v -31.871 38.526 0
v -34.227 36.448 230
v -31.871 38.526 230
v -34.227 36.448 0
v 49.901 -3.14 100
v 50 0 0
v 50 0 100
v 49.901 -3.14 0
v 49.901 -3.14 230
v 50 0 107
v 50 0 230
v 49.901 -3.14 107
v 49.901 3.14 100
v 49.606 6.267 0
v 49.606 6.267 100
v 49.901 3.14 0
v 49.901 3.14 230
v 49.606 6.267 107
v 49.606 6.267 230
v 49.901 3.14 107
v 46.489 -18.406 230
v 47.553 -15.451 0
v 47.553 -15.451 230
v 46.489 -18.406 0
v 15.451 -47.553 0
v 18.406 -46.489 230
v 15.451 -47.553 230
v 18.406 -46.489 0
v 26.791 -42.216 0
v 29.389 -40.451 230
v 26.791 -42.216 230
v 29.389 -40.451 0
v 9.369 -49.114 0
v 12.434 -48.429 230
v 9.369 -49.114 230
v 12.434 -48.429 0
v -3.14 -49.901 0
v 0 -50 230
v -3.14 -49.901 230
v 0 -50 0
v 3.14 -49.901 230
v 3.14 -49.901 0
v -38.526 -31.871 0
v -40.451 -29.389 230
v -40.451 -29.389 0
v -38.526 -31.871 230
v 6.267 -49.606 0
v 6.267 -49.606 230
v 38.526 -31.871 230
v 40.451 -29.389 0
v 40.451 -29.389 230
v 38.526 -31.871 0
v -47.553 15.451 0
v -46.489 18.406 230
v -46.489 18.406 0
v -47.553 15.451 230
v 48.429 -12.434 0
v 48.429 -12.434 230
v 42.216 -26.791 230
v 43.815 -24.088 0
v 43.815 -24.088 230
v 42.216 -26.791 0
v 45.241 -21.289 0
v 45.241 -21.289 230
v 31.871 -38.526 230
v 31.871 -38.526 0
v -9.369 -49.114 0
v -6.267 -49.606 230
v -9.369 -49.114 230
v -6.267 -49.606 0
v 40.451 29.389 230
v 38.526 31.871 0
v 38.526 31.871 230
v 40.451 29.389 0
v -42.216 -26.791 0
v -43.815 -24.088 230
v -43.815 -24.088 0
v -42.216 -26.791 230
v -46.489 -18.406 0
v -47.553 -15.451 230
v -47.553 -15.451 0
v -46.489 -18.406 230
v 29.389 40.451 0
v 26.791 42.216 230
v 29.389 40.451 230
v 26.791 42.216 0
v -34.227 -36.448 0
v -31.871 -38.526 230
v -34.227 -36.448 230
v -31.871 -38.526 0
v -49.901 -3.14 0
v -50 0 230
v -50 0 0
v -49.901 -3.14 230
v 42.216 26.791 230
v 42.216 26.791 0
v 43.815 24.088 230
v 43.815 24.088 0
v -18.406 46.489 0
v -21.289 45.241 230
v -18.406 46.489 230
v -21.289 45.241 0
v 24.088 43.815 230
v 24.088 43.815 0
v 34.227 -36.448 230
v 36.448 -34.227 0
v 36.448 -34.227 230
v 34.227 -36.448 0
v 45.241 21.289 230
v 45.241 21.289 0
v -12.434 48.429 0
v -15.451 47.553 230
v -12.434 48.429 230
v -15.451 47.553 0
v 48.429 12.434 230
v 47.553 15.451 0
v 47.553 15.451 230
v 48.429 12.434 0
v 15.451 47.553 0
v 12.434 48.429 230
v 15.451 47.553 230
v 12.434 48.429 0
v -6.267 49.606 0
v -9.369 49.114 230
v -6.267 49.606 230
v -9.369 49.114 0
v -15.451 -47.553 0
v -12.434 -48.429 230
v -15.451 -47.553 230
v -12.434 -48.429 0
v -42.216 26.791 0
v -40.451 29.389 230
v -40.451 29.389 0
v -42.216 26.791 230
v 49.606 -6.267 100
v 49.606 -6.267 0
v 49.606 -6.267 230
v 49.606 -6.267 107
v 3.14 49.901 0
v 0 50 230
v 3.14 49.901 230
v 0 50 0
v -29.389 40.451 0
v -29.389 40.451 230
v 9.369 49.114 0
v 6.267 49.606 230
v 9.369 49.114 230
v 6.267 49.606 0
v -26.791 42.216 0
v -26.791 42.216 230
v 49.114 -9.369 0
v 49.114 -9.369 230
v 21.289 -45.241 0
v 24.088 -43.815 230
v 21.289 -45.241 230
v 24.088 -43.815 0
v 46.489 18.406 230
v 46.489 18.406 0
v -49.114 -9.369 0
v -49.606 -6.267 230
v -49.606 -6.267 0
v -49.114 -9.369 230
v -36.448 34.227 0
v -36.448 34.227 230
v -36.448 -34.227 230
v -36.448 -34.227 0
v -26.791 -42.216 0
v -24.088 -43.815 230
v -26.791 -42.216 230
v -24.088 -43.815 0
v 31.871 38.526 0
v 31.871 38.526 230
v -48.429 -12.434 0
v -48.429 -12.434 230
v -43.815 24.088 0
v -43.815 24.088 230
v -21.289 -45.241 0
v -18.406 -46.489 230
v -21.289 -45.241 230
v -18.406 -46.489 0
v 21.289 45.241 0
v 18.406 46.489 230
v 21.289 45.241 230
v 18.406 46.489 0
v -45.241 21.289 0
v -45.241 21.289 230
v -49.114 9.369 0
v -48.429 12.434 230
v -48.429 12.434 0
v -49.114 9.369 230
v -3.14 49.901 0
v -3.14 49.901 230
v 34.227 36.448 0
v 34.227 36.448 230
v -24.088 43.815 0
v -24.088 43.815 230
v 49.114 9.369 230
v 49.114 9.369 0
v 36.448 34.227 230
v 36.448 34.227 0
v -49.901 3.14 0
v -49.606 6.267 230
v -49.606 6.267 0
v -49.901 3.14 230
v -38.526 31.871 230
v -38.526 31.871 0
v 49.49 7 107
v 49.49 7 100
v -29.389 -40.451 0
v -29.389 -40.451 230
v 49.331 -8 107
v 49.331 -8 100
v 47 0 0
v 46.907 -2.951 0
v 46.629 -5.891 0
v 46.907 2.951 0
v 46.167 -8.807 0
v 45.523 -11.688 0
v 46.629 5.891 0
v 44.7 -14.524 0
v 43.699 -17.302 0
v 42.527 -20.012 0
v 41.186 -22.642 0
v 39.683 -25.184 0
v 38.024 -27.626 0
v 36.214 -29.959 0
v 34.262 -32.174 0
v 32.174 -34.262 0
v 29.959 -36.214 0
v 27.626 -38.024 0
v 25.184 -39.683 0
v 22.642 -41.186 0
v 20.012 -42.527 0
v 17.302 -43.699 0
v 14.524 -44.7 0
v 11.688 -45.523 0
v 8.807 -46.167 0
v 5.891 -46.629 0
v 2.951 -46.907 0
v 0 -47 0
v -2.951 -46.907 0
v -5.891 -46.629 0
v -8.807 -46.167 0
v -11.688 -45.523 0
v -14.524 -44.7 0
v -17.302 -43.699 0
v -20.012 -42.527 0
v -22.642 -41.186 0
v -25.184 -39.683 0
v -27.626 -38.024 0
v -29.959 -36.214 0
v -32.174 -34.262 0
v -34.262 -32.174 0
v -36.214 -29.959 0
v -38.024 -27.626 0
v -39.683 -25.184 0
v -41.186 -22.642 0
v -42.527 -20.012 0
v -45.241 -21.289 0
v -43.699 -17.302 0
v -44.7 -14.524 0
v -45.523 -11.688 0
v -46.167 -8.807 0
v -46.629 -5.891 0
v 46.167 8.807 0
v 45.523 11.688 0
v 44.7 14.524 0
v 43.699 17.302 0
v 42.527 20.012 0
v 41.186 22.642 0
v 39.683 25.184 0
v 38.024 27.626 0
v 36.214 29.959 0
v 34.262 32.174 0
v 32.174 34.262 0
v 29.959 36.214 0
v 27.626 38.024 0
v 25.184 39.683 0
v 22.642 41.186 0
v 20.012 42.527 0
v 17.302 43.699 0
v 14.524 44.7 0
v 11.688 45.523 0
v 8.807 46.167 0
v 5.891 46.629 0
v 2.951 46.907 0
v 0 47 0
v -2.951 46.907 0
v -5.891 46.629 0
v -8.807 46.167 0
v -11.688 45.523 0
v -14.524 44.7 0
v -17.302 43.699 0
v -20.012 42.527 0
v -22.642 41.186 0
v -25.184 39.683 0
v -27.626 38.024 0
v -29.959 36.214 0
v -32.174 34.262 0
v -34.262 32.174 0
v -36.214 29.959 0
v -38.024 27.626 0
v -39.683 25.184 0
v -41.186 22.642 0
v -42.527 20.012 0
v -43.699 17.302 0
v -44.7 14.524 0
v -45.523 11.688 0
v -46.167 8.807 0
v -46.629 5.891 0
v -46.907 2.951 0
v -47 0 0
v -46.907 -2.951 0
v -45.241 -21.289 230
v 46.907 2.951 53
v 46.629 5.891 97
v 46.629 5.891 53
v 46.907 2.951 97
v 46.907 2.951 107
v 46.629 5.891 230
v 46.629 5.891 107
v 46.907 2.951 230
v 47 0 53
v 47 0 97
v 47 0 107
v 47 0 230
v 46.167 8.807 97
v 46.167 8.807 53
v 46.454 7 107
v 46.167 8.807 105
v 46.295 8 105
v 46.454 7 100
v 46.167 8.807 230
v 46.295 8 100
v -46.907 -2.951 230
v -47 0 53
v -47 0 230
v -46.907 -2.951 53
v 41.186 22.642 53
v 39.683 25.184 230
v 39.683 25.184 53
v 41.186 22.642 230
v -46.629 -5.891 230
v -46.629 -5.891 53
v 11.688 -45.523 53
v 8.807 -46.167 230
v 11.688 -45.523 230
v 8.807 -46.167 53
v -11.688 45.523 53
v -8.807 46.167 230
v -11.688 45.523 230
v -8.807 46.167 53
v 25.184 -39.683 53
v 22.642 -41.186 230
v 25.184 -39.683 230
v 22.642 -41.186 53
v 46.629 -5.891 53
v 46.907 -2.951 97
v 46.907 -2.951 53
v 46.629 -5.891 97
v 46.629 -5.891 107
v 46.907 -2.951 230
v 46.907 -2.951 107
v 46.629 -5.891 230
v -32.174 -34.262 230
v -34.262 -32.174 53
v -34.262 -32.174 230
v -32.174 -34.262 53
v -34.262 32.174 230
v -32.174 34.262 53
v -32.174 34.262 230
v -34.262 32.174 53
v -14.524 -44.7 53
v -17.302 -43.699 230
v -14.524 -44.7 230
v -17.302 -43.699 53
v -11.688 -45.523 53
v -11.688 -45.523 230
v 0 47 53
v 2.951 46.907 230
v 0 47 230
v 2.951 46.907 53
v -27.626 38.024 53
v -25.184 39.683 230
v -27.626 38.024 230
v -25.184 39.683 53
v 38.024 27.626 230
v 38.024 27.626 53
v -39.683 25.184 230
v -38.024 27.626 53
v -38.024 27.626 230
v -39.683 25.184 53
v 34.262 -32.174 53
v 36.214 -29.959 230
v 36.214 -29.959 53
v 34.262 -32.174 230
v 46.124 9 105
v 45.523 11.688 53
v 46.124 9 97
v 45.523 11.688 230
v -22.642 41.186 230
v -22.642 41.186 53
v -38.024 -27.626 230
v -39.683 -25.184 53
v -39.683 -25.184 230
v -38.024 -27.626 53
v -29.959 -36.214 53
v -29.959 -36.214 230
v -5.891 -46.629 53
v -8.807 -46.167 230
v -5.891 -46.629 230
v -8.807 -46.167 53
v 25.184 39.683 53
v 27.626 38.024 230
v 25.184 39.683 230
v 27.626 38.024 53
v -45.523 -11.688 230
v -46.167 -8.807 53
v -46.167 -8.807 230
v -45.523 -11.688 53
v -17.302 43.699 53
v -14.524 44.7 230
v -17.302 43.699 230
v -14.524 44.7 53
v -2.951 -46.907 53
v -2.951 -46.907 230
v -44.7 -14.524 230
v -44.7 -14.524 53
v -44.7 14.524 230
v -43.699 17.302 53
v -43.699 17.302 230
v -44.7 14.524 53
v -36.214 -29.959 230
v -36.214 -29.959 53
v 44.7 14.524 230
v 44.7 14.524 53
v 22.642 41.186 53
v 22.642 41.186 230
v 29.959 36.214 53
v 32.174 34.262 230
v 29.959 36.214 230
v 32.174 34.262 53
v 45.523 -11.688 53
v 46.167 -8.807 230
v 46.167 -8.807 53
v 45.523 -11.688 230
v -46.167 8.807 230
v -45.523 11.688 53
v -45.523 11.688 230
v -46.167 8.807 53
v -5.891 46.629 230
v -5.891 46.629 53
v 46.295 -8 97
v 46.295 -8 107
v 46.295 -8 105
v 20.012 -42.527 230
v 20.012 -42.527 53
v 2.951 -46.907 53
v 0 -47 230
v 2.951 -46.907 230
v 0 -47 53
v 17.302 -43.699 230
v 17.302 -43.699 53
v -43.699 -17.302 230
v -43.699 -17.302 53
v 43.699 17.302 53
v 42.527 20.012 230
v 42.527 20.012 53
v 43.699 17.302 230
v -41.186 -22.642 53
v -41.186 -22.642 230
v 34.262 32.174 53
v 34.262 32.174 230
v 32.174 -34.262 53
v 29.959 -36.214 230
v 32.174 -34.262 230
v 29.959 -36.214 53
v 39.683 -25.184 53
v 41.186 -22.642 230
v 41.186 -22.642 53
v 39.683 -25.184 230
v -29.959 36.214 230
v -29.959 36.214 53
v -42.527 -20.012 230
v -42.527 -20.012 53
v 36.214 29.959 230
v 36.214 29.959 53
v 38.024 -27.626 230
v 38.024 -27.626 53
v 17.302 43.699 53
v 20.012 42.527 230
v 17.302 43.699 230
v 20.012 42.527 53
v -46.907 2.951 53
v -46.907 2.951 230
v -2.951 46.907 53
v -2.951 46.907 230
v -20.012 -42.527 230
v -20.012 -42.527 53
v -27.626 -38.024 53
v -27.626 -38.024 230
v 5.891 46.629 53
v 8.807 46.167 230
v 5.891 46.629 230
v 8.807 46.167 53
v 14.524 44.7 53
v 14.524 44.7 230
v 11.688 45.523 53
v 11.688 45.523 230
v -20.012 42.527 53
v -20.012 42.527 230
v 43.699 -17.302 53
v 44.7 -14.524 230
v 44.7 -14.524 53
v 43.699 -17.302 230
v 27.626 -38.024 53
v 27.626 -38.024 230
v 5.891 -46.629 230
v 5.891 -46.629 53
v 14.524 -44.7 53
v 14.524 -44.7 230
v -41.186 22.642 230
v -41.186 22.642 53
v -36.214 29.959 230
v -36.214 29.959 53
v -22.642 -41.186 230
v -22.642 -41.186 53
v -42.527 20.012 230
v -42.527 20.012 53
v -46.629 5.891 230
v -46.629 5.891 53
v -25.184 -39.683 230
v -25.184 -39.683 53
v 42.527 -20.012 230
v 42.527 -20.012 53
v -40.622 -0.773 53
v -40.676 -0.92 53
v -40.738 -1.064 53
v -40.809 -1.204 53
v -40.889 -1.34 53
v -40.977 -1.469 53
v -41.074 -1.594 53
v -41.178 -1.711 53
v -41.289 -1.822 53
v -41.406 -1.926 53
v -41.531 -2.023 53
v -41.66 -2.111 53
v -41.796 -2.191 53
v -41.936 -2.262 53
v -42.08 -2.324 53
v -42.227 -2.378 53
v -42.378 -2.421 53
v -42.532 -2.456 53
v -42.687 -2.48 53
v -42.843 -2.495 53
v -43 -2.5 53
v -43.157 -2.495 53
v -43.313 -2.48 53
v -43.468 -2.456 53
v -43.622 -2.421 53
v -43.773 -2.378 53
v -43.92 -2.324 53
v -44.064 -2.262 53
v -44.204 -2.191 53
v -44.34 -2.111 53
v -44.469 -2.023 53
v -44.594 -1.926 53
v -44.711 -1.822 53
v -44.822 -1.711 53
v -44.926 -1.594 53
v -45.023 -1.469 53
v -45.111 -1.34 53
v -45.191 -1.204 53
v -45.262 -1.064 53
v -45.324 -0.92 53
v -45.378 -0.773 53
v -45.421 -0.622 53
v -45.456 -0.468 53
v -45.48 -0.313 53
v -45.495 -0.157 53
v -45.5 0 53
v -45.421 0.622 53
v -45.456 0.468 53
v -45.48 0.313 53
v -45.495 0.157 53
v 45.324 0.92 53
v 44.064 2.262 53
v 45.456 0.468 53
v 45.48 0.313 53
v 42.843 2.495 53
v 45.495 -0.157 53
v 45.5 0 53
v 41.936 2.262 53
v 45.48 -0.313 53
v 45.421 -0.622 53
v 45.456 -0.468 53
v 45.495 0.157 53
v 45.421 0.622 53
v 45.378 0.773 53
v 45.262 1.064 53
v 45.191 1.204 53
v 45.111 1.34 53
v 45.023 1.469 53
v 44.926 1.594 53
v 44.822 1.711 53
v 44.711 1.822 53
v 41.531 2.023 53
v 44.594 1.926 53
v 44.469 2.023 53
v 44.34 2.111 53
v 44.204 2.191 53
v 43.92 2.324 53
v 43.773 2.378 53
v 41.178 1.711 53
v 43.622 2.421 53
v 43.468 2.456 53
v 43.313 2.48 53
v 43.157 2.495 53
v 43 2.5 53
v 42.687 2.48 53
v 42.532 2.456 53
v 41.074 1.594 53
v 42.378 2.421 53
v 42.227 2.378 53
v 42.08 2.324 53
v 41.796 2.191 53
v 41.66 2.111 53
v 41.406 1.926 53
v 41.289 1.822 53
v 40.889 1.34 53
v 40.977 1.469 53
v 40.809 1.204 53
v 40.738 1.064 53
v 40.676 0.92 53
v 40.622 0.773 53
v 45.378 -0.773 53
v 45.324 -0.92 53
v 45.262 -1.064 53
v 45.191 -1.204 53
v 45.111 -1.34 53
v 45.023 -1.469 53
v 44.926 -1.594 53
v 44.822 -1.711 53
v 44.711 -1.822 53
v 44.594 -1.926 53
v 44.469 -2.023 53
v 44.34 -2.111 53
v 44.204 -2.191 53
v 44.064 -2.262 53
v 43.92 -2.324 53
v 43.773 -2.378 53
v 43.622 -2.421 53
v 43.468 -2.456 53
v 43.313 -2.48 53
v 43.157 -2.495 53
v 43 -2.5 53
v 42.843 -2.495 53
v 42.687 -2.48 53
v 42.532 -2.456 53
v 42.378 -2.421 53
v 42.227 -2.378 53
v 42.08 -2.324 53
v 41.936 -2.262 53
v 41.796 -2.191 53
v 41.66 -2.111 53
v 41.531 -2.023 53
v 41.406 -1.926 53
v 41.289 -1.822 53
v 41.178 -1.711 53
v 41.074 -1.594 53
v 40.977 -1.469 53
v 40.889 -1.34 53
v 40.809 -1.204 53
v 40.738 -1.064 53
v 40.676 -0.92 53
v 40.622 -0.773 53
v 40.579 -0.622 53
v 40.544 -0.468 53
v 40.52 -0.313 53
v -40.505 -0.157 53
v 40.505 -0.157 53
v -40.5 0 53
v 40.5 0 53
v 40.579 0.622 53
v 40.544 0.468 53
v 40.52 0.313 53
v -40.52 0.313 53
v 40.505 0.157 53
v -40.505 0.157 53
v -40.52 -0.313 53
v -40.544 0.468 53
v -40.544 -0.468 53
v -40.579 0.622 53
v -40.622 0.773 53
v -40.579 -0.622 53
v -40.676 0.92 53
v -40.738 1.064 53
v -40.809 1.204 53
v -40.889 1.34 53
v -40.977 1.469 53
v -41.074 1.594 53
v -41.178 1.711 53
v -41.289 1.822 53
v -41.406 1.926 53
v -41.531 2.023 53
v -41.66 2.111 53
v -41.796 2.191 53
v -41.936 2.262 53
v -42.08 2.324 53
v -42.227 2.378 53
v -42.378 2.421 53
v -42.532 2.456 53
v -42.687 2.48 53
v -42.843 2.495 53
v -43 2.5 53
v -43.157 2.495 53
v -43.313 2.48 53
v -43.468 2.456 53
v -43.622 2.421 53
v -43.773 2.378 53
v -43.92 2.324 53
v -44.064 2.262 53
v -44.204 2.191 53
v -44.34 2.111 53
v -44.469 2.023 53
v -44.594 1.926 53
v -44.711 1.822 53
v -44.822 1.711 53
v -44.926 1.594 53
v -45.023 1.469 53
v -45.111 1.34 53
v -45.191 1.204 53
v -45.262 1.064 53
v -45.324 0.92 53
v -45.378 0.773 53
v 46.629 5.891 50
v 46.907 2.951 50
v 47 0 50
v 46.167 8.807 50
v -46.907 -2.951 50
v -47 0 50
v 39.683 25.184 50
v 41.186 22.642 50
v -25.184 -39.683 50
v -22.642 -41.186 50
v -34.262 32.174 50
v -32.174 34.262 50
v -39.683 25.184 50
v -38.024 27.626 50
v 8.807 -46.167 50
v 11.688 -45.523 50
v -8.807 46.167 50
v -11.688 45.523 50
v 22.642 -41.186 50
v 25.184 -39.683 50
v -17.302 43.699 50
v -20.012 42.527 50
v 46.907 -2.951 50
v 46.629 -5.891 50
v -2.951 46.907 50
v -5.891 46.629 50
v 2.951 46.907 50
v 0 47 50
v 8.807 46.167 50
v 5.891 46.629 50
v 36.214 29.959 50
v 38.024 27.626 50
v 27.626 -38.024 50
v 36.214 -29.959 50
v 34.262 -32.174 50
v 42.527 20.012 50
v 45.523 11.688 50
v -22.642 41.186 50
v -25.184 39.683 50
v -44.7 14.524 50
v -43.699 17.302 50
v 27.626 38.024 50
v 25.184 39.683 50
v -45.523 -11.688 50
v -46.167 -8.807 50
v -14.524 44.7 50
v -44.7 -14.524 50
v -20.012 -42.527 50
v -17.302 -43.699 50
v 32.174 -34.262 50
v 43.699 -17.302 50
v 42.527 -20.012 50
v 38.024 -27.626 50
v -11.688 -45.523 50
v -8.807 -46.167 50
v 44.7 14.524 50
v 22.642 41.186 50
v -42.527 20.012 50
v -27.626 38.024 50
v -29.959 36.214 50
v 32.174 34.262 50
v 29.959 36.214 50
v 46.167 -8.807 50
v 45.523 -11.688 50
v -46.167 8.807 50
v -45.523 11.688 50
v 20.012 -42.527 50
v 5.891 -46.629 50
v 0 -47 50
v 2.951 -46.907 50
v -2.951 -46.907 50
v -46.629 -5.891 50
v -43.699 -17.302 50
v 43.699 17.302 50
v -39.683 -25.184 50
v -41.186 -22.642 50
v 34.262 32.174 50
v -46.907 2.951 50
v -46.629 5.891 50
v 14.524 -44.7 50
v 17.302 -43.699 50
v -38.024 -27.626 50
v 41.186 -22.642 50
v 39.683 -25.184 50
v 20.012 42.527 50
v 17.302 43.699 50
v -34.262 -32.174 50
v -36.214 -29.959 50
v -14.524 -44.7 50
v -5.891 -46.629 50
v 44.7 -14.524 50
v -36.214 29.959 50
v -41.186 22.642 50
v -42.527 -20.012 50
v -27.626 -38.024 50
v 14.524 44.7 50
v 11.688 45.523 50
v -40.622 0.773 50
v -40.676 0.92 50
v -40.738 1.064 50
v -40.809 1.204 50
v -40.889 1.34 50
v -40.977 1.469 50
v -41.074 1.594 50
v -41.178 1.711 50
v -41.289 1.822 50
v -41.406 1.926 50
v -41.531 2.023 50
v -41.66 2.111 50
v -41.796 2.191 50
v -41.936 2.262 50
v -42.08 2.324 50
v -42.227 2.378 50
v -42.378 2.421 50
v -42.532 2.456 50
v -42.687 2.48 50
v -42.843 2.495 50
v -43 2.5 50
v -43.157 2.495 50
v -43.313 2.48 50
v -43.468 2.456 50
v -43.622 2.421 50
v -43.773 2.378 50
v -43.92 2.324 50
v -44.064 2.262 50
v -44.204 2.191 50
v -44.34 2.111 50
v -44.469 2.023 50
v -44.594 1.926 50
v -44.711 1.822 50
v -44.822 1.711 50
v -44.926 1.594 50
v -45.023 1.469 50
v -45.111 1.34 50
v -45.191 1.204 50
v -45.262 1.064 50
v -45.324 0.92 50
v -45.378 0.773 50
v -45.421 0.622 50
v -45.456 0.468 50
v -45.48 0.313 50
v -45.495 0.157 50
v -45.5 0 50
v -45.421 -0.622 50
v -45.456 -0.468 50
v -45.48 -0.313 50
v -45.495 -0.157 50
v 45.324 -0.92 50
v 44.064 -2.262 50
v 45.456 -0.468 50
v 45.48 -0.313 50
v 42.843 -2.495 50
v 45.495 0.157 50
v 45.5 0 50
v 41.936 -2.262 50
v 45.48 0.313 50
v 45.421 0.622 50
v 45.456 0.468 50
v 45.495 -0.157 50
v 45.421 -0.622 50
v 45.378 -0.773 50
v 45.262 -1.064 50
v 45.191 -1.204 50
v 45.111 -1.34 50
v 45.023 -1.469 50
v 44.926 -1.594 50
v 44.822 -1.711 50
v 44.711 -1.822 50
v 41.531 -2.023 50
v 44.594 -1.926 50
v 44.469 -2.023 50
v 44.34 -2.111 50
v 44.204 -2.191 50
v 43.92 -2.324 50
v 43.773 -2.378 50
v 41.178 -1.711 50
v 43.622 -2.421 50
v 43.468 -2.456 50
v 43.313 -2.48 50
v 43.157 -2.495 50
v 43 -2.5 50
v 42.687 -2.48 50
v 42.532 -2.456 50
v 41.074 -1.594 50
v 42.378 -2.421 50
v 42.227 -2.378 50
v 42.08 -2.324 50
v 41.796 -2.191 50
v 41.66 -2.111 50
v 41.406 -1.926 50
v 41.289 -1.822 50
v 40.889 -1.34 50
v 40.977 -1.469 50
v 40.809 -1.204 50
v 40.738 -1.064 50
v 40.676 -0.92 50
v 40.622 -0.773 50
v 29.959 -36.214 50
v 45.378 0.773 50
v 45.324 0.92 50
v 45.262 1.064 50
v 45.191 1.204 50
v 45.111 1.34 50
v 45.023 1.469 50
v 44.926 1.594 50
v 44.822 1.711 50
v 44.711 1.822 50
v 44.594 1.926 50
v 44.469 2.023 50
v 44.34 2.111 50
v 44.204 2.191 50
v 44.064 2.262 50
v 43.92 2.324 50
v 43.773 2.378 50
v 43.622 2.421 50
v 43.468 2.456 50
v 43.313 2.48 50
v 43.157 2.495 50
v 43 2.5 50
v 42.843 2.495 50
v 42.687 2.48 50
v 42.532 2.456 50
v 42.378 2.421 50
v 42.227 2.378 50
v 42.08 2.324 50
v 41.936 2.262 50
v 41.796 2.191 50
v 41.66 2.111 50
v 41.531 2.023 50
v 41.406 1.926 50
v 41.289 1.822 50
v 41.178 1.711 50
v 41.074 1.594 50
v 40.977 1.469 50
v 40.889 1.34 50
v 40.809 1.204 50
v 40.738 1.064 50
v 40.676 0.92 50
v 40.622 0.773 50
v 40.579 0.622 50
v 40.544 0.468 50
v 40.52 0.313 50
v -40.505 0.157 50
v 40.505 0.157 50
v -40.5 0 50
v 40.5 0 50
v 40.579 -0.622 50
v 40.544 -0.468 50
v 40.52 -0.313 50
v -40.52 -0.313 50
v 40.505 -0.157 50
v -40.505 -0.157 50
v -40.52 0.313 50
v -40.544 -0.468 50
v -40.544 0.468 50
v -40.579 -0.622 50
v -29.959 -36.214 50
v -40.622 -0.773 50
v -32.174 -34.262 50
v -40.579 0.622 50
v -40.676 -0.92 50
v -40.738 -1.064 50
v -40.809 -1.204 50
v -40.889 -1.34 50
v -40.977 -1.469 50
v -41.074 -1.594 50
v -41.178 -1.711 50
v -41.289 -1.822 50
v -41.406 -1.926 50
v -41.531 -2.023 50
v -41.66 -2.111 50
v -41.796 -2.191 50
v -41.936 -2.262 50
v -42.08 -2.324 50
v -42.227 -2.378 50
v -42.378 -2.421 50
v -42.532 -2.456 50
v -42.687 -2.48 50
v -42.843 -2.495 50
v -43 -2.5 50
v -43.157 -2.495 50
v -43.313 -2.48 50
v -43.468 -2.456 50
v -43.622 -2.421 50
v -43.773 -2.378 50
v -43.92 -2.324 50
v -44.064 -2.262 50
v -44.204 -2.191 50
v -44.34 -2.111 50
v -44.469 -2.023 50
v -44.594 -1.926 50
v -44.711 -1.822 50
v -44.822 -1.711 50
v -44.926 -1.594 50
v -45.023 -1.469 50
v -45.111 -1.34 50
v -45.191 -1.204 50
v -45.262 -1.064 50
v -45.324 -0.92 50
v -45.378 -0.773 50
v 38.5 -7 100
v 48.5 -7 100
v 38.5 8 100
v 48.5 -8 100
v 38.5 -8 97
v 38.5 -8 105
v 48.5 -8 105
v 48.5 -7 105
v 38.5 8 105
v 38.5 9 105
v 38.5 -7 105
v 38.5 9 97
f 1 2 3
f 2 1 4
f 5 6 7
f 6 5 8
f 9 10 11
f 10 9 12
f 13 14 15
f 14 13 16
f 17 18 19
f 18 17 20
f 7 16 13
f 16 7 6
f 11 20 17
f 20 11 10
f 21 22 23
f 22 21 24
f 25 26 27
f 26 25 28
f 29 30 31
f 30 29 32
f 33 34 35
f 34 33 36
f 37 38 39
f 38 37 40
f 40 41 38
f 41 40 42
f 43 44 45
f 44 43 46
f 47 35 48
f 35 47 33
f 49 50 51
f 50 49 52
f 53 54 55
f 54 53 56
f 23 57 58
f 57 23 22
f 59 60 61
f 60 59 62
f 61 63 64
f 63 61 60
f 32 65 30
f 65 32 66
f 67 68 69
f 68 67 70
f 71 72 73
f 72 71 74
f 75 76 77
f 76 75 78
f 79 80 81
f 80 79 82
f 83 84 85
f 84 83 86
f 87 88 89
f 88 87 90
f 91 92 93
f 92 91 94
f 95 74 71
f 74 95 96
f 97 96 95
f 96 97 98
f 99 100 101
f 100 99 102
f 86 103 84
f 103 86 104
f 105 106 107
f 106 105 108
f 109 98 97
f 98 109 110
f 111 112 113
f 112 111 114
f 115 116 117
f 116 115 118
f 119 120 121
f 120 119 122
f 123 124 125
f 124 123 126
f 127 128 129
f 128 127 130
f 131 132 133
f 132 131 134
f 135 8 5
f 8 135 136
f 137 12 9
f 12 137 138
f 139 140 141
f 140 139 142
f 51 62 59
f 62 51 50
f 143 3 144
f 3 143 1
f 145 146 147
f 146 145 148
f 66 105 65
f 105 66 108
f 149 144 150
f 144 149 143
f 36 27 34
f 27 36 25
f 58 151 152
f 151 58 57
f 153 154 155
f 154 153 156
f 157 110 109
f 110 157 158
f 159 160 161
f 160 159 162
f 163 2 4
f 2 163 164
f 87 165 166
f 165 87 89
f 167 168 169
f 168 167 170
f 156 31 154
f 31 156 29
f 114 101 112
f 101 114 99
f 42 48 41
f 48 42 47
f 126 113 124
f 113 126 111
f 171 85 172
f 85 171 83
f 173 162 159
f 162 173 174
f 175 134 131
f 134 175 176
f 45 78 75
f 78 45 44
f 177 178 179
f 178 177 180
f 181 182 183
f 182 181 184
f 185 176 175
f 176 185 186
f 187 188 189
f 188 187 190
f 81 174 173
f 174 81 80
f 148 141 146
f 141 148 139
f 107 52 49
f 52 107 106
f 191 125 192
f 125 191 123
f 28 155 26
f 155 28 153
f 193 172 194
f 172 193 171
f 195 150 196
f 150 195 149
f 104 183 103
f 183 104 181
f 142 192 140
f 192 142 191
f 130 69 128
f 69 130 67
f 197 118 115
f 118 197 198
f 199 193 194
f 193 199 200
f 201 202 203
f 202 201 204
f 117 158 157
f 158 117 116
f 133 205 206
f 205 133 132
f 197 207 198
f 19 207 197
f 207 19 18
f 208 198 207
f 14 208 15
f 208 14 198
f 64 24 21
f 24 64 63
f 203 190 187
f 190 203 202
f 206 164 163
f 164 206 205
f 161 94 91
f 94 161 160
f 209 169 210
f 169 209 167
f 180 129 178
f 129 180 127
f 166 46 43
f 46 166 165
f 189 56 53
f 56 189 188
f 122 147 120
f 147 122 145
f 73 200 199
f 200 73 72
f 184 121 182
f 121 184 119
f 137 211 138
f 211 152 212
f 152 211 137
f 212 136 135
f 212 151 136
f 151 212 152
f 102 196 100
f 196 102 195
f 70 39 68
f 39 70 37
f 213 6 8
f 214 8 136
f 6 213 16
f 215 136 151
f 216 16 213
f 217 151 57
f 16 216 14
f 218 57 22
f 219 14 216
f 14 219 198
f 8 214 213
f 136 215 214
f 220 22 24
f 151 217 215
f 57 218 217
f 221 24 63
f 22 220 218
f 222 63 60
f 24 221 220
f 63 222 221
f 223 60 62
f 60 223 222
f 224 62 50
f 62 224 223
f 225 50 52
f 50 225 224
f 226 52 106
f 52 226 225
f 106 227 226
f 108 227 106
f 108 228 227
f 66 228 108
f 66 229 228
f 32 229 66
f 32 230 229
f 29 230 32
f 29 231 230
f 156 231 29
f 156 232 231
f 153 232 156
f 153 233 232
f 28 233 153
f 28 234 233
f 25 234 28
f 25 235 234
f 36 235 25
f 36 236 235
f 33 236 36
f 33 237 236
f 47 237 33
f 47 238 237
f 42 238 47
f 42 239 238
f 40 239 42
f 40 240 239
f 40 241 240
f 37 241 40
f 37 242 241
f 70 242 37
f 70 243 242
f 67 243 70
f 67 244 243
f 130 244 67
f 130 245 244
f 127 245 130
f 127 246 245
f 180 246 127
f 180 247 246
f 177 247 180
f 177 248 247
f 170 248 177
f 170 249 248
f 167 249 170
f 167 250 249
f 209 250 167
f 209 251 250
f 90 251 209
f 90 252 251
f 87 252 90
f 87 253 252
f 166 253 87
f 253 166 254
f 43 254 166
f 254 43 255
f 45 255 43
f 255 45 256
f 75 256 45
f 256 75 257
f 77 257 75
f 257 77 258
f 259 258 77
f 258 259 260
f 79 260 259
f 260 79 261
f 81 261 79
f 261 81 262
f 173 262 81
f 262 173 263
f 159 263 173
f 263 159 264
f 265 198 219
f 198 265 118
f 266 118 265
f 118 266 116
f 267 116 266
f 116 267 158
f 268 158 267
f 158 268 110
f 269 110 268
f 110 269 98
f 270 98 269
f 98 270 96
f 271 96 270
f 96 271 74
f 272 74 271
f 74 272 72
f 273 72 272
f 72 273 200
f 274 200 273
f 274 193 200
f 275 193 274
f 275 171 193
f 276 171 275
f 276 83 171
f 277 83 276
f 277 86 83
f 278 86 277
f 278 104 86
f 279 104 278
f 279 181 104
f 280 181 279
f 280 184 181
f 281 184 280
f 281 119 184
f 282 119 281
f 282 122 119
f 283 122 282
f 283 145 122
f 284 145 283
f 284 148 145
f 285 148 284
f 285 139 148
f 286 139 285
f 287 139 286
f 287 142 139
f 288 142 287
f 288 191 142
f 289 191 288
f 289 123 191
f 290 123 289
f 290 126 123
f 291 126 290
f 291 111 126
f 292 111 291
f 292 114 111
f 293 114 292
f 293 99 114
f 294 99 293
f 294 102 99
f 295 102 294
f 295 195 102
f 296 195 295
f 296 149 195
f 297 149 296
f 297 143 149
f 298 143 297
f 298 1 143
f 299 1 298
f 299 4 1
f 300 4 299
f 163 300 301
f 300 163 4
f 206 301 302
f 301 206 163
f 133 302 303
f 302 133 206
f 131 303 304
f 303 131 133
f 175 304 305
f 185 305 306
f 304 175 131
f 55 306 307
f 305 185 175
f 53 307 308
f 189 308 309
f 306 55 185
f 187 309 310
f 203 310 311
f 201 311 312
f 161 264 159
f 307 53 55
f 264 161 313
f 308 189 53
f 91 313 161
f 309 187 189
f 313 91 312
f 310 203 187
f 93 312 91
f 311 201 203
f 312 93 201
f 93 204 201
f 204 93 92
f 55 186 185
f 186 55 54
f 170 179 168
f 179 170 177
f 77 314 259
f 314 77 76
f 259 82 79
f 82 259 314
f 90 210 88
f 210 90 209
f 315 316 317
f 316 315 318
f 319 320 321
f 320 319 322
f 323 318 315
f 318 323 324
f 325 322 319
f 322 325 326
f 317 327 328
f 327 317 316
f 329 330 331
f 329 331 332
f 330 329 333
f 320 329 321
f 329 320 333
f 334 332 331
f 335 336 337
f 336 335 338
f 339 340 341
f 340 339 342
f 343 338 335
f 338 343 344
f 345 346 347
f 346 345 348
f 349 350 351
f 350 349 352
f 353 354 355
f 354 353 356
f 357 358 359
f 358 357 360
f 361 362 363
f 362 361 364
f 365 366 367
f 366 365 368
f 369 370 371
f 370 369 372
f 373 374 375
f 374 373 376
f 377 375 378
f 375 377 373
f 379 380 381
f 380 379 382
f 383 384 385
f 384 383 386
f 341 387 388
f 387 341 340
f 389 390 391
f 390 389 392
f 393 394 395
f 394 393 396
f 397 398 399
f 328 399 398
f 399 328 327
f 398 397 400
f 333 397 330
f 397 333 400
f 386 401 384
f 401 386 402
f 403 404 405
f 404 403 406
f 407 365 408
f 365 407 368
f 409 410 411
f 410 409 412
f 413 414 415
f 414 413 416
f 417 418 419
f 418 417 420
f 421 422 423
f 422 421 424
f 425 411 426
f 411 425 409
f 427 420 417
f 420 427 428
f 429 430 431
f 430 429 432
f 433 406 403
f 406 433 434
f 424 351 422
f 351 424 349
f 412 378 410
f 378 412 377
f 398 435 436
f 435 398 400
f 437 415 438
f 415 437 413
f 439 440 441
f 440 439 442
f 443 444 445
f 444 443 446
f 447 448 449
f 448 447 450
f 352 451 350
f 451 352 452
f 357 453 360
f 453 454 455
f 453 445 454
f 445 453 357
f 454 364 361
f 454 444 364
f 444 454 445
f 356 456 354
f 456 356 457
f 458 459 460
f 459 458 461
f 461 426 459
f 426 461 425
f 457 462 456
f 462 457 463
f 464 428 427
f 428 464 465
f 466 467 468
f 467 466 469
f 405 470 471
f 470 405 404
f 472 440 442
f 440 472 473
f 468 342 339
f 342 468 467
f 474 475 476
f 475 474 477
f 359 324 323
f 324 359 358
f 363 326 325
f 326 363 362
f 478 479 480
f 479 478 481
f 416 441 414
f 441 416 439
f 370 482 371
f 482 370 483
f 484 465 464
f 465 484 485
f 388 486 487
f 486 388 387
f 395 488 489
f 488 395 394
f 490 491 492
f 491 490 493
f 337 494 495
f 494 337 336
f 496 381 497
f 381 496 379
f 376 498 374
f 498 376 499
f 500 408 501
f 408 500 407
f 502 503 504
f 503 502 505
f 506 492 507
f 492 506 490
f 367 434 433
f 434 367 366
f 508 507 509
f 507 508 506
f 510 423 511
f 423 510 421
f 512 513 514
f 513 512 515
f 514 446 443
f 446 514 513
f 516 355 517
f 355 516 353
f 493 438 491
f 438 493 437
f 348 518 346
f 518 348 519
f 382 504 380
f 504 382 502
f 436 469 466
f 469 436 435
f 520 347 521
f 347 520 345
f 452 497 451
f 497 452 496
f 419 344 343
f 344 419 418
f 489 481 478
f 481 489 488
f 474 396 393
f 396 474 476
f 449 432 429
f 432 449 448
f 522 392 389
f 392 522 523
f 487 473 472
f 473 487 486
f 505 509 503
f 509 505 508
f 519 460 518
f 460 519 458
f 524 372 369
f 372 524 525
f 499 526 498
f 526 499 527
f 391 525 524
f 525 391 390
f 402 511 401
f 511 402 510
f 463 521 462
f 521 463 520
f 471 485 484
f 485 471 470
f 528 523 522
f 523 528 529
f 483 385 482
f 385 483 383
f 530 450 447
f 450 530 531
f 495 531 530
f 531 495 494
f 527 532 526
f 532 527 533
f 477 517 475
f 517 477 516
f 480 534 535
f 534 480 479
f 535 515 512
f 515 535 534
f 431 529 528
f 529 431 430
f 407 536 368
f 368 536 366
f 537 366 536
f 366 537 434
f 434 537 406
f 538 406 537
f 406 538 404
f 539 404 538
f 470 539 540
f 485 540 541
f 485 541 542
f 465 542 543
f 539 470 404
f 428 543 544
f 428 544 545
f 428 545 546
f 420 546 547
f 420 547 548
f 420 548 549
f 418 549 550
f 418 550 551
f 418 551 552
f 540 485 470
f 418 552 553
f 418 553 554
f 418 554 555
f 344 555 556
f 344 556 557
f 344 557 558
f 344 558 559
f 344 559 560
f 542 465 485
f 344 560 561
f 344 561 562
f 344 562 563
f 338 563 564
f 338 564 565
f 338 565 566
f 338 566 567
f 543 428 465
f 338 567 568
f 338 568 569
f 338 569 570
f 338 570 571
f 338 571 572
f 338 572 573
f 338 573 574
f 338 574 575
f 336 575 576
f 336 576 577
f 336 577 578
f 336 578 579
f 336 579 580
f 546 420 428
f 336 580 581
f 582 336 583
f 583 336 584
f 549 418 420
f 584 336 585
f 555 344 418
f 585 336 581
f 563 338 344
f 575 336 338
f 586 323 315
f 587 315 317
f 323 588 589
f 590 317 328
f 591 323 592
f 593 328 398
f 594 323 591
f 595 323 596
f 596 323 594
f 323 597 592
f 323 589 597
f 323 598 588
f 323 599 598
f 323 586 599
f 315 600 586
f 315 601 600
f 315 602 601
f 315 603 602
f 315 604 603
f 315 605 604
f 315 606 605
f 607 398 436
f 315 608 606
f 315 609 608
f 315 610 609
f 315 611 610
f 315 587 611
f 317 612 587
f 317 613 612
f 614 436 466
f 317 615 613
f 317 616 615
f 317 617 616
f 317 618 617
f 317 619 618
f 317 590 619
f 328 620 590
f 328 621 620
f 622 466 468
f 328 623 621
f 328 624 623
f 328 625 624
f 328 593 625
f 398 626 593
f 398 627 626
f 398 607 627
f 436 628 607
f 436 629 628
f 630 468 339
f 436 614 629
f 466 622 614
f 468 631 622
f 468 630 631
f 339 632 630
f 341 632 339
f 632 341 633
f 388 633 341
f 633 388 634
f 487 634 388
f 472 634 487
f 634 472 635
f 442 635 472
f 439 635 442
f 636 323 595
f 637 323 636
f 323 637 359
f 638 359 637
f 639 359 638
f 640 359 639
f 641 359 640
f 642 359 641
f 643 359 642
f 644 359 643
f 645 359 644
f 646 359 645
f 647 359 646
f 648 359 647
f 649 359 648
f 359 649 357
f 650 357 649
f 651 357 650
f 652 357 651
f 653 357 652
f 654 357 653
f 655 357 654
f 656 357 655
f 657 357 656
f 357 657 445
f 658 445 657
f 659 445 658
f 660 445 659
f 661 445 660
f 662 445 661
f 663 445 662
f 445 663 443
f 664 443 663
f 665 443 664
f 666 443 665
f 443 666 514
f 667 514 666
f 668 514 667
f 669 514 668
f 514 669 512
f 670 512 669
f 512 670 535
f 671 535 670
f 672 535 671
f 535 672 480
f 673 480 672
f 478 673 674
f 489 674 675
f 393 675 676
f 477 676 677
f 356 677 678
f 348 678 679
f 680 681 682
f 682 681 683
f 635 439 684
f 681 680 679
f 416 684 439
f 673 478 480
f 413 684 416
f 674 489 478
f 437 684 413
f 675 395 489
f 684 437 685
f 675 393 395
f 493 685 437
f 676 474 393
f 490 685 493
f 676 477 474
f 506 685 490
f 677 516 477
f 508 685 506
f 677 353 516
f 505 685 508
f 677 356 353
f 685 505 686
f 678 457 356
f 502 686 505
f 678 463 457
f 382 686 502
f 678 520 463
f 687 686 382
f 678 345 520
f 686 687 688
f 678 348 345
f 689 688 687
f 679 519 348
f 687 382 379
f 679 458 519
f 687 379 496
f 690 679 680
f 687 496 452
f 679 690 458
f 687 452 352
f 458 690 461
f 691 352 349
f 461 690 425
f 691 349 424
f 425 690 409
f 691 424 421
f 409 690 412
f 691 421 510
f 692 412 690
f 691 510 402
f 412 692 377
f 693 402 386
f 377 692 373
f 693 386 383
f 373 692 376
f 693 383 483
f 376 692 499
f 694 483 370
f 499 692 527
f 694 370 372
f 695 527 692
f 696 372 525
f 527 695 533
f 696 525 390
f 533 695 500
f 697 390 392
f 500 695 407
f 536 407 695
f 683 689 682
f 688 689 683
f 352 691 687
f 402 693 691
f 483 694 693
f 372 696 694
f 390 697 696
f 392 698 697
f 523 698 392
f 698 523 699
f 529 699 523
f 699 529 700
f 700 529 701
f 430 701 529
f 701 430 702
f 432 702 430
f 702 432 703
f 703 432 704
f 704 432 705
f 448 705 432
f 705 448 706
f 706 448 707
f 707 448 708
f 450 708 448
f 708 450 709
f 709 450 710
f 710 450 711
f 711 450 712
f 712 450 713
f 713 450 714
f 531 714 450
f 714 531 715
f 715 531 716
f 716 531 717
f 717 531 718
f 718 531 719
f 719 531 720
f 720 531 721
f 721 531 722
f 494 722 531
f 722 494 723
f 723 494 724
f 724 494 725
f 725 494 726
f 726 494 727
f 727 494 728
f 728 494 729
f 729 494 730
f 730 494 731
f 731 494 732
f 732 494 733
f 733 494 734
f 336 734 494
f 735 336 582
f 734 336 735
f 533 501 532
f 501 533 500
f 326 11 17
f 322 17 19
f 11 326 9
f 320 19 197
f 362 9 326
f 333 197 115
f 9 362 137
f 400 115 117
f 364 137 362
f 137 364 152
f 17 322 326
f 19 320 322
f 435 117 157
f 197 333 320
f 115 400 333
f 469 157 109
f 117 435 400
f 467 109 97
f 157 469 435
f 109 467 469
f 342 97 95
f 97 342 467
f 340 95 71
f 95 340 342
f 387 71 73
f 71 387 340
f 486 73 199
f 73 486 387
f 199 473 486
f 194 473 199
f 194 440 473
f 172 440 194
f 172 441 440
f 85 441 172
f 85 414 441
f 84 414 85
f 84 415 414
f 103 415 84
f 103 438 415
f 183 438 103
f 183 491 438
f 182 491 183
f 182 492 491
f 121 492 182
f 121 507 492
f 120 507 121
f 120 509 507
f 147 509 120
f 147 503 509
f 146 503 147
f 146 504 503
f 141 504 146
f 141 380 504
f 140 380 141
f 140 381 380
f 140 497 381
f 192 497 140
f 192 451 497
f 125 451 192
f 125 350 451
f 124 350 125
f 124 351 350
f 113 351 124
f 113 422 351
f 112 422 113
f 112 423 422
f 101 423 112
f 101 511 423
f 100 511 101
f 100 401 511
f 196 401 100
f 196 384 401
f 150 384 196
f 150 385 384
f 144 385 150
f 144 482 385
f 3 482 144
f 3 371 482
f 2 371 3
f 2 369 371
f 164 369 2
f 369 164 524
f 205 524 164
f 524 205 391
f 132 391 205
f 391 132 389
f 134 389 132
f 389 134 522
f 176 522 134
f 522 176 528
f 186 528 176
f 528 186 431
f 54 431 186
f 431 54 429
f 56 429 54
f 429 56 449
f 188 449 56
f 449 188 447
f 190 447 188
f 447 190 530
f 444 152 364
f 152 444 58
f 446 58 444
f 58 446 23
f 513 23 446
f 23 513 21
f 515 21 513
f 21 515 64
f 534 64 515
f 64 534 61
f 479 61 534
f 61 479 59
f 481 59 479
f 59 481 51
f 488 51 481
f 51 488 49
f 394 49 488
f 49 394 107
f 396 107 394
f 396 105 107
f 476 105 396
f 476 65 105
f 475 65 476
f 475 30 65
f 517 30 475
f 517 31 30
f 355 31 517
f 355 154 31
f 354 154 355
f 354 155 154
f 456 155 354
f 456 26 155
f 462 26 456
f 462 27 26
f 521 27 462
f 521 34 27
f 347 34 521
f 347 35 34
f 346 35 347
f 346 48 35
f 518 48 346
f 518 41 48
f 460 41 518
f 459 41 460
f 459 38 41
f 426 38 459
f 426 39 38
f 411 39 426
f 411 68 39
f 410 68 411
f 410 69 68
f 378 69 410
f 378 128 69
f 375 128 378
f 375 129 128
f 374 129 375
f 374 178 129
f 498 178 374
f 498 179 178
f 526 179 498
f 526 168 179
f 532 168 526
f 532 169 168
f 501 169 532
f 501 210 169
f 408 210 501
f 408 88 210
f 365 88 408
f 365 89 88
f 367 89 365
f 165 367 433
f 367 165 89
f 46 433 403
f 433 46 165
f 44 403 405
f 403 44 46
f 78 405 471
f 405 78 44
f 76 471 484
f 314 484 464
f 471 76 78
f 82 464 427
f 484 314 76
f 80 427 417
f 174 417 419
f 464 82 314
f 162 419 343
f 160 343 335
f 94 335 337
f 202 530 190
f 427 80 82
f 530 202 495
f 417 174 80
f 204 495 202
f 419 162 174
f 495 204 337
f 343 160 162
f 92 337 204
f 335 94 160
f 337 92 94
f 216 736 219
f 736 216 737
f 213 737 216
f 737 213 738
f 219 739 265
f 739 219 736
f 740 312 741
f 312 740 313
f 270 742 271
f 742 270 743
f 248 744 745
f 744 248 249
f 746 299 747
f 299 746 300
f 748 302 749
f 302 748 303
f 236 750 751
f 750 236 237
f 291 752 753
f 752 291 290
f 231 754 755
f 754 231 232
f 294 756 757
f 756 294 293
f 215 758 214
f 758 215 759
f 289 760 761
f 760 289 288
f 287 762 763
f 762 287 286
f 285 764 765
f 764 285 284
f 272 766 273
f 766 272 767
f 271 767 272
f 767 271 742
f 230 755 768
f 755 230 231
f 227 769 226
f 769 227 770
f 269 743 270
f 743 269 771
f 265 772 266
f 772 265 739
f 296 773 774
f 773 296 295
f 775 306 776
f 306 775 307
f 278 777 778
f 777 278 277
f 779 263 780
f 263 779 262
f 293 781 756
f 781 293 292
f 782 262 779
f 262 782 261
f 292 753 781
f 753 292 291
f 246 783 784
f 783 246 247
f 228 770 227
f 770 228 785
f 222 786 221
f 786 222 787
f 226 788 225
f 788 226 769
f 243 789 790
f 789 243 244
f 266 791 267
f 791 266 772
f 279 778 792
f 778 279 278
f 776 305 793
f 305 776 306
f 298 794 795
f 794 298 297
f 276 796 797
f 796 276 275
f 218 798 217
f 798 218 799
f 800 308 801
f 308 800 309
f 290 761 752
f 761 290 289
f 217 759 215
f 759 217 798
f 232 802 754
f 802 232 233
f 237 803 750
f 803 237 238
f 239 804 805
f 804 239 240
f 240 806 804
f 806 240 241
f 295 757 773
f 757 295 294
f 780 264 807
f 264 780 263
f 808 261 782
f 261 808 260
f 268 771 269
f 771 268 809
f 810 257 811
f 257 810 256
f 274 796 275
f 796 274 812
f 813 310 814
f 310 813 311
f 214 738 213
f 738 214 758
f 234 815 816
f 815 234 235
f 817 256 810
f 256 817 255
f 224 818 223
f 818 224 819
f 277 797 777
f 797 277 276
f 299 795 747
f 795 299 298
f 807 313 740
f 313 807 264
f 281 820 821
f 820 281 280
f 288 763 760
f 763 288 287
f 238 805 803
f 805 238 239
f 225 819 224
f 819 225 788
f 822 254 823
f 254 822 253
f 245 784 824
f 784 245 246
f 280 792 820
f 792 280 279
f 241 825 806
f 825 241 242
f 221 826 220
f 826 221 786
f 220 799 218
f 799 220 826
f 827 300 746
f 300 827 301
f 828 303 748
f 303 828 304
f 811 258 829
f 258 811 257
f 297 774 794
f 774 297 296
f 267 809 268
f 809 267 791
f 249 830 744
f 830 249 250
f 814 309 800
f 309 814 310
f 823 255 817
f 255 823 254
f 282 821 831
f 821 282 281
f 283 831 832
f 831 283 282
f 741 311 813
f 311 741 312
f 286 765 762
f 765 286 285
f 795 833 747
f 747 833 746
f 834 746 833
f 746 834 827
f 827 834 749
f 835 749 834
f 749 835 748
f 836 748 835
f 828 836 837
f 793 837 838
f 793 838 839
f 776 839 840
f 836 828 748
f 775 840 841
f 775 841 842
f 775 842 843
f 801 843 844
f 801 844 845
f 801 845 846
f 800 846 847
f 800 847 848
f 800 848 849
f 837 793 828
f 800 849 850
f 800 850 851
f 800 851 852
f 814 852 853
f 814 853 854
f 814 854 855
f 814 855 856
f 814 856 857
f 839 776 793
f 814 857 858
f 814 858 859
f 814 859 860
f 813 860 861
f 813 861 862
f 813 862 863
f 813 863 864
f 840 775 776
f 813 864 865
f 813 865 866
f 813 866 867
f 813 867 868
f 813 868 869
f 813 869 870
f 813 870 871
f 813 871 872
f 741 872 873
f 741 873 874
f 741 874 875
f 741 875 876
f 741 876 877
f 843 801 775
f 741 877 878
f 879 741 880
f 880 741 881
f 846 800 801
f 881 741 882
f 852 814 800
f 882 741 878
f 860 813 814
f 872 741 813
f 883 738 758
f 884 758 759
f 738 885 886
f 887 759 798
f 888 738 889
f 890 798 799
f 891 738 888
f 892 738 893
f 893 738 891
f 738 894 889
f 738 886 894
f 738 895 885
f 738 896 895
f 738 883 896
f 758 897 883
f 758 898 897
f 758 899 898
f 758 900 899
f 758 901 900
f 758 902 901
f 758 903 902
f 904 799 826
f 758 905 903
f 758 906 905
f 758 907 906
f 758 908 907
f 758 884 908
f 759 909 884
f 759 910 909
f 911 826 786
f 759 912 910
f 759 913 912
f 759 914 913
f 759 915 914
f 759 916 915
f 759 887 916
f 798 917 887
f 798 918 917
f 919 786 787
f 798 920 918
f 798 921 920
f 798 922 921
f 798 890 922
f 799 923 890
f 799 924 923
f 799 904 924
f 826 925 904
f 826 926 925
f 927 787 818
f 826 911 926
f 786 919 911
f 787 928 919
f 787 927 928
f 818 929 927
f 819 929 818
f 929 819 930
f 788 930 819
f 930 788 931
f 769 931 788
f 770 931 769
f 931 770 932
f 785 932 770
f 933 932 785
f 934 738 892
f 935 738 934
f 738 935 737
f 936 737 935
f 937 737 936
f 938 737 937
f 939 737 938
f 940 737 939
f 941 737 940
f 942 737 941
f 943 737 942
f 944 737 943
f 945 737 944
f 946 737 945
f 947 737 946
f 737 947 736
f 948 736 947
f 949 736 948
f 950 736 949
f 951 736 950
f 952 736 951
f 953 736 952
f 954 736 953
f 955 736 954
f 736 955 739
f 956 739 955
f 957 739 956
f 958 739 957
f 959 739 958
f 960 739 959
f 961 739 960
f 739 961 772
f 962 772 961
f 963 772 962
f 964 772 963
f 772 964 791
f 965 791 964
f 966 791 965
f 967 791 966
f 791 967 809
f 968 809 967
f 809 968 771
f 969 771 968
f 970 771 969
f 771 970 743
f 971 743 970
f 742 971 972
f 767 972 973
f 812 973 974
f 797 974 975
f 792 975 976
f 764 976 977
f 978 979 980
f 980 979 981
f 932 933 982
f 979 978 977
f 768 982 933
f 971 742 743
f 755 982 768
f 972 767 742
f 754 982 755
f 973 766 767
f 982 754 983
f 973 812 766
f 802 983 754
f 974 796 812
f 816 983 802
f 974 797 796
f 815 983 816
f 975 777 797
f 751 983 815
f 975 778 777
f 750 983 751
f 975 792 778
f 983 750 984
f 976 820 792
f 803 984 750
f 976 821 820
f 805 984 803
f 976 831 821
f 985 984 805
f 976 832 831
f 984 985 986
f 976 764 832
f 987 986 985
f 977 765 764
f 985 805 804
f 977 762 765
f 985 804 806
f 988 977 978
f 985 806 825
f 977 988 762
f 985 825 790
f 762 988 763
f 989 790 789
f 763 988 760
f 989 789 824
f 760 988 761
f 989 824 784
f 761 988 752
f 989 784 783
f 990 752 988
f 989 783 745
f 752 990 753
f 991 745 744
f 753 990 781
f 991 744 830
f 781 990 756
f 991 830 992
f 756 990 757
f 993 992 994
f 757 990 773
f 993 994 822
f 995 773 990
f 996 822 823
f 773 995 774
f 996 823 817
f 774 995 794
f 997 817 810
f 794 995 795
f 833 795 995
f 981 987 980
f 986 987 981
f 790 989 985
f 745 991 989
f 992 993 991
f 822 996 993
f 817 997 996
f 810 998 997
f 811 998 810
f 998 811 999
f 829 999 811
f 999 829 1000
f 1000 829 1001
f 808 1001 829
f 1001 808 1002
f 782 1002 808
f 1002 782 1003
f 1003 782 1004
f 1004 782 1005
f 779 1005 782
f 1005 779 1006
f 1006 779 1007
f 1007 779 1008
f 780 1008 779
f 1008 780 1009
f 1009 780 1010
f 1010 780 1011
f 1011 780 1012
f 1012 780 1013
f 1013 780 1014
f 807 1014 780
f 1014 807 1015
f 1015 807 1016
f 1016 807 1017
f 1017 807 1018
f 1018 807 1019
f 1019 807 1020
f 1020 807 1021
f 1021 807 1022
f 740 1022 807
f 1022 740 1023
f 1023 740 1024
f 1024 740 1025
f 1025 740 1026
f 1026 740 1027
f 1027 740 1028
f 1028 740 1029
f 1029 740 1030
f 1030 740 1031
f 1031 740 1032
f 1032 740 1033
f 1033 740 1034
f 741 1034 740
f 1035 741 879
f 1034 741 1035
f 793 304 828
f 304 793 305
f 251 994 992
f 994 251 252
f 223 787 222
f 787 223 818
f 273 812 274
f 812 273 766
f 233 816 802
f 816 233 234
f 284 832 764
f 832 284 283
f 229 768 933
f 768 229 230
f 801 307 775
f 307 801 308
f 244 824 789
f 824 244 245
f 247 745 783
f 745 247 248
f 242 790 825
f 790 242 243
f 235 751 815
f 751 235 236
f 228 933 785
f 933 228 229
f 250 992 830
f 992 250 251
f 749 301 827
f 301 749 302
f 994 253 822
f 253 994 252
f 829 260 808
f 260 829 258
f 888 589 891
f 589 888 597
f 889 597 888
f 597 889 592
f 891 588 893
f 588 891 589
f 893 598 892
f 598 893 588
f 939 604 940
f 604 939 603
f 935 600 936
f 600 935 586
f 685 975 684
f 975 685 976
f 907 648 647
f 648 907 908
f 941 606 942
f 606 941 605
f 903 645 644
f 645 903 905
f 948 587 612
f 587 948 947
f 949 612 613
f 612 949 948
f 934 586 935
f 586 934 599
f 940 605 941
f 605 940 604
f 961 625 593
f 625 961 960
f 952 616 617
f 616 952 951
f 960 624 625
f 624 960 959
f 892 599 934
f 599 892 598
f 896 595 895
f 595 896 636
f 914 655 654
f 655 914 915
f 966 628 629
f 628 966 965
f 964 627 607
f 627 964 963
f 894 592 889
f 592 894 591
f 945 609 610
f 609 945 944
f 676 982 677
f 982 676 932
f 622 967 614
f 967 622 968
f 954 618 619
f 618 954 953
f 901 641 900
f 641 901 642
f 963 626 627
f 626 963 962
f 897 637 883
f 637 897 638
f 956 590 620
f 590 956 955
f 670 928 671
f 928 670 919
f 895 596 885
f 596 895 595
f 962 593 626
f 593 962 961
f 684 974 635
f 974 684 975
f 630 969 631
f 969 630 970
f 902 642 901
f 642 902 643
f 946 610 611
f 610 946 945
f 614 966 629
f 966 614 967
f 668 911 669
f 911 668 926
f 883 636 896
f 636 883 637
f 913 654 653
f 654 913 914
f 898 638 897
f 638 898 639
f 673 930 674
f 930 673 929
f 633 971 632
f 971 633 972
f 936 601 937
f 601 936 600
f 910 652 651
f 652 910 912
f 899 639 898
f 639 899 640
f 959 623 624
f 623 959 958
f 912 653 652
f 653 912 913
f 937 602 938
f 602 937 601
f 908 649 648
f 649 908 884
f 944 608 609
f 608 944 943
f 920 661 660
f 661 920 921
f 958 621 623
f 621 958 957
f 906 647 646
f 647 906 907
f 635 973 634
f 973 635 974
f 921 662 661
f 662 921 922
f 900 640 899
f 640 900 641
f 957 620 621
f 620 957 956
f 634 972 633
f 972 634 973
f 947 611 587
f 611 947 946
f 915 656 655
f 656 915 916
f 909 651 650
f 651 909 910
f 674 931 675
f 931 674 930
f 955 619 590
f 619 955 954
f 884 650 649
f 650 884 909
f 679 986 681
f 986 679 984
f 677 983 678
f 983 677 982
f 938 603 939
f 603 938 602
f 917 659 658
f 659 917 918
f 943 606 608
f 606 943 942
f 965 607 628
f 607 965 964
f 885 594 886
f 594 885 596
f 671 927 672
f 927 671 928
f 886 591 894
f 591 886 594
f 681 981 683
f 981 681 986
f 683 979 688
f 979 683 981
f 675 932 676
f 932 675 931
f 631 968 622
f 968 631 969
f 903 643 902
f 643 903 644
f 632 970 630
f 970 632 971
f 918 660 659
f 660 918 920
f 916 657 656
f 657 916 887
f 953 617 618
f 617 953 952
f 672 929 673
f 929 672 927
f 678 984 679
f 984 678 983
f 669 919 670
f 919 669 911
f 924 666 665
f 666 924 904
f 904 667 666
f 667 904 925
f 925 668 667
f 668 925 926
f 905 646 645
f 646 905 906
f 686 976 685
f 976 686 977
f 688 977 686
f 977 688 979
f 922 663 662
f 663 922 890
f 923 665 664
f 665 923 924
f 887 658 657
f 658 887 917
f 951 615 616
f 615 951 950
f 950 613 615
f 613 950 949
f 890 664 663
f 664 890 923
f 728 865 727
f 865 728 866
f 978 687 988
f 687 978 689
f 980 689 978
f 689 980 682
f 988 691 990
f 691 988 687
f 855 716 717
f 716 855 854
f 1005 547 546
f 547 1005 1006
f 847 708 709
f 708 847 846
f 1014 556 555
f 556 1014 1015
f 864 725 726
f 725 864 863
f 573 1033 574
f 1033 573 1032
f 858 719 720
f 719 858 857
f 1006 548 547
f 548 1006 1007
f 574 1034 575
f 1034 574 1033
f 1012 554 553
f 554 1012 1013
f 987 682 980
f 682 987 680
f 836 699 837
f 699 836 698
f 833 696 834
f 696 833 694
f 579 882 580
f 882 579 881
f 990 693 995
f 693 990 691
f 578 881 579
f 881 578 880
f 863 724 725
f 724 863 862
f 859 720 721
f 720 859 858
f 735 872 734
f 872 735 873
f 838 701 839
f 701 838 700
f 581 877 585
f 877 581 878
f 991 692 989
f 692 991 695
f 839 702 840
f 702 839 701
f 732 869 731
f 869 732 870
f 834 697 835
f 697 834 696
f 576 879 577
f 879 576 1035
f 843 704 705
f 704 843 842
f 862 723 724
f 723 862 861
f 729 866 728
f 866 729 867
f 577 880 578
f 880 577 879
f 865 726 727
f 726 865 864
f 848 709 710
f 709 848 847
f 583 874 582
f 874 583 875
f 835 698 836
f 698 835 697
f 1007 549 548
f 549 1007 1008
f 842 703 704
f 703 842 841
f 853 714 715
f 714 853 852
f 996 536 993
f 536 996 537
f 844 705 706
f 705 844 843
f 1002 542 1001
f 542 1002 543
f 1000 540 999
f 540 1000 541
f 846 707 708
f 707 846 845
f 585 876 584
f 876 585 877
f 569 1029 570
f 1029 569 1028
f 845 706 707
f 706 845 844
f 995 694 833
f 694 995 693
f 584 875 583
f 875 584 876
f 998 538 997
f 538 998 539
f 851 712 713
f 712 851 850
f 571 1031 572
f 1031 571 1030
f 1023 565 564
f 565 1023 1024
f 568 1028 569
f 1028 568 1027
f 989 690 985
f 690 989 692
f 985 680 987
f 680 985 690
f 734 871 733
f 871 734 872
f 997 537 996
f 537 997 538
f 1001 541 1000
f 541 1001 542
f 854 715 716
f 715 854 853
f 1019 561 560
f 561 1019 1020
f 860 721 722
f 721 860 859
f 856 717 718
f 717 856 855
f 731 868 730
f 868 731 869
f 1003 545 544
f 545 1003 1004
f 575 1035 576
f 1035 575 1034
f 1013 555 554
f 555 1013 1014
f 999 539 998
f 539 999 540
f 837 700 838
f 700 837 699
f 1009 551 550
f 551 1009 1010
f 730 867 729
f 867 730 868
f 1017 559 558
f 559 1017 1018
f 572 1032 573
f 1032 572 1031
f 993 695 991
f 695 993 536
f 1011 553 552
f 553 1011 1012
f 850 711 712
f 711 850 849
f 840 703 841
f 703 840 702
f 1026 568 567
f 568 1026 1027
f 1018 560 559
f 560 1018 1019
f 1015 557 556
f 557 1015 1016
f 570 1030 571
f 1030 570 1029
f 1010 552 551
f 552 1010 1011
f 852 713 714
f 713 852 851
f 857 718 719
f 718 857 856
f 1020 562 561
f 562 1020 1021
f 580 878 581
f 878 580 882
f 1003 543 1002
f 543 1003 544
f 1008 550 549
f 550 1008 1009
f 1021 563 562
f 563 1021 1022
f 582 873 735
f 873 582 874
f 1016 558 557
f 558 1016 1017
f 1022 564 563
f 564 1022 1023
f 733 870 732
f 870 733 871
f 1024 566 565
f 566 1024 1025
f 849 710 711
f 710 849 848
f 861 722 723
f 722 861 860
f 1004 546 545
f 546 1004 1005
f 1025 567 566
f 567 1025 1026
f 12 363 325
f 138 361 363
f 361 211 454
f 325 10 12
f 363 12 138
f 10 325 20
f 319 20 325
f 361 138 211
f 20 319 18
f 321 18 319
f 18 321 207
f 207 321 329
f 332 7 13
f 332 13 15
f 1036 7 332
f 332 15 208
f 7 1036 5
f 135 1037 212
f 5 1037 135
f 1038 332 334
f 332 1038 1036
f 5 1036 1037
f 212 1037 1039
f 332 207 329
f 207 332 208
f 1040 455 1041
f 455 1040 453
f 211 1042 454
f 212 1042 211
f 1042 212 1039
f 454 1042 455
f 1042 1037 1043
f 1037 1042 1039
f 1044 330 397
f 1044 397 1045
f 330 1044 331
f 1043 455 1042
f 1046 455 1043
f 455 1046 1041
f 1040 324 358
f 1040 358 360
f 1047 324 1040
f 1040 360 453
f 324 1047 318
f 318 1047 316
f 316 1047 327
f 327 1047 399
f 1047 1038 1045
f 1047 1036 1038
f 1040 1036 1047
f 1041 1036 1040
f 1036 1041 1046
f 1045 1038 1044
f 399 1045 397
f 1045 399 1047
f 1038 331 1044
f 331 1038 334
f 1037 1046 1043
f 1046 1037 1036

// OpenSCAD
rad=50;
h1=250;
h2=50;
module base(rad, h1, h2){
difference(){
cylinder(h1,rad,rad,$fn=100);
    translate([0,0,h2+3])
    cylinder(h1-h2,rad-3,rad-3,$fn=100);
    translate([0,0,h1-20])
    cylinder(21,rad+1,rad+1,$fn=100);
    translate([0,0,-1])
    cylinder(h2+1,rad-3,rad-3,$fn=100);
    translate([43,0,49])
    cylinder(5,2.5,2.5,$fn=100);
    translate([-43,0,49])
    cylinder(5,2.5,2.5,$fn=100);
    translate([43,-8,100])
    cube([10,15,7]);

}
translate([38.5,-8,97])
union(){
    difference(){
    cube([10,17,8]);
    translate([-1,1,3])
    cube([12,15,7]);
    }
}}

base(rad, h1, h2);
